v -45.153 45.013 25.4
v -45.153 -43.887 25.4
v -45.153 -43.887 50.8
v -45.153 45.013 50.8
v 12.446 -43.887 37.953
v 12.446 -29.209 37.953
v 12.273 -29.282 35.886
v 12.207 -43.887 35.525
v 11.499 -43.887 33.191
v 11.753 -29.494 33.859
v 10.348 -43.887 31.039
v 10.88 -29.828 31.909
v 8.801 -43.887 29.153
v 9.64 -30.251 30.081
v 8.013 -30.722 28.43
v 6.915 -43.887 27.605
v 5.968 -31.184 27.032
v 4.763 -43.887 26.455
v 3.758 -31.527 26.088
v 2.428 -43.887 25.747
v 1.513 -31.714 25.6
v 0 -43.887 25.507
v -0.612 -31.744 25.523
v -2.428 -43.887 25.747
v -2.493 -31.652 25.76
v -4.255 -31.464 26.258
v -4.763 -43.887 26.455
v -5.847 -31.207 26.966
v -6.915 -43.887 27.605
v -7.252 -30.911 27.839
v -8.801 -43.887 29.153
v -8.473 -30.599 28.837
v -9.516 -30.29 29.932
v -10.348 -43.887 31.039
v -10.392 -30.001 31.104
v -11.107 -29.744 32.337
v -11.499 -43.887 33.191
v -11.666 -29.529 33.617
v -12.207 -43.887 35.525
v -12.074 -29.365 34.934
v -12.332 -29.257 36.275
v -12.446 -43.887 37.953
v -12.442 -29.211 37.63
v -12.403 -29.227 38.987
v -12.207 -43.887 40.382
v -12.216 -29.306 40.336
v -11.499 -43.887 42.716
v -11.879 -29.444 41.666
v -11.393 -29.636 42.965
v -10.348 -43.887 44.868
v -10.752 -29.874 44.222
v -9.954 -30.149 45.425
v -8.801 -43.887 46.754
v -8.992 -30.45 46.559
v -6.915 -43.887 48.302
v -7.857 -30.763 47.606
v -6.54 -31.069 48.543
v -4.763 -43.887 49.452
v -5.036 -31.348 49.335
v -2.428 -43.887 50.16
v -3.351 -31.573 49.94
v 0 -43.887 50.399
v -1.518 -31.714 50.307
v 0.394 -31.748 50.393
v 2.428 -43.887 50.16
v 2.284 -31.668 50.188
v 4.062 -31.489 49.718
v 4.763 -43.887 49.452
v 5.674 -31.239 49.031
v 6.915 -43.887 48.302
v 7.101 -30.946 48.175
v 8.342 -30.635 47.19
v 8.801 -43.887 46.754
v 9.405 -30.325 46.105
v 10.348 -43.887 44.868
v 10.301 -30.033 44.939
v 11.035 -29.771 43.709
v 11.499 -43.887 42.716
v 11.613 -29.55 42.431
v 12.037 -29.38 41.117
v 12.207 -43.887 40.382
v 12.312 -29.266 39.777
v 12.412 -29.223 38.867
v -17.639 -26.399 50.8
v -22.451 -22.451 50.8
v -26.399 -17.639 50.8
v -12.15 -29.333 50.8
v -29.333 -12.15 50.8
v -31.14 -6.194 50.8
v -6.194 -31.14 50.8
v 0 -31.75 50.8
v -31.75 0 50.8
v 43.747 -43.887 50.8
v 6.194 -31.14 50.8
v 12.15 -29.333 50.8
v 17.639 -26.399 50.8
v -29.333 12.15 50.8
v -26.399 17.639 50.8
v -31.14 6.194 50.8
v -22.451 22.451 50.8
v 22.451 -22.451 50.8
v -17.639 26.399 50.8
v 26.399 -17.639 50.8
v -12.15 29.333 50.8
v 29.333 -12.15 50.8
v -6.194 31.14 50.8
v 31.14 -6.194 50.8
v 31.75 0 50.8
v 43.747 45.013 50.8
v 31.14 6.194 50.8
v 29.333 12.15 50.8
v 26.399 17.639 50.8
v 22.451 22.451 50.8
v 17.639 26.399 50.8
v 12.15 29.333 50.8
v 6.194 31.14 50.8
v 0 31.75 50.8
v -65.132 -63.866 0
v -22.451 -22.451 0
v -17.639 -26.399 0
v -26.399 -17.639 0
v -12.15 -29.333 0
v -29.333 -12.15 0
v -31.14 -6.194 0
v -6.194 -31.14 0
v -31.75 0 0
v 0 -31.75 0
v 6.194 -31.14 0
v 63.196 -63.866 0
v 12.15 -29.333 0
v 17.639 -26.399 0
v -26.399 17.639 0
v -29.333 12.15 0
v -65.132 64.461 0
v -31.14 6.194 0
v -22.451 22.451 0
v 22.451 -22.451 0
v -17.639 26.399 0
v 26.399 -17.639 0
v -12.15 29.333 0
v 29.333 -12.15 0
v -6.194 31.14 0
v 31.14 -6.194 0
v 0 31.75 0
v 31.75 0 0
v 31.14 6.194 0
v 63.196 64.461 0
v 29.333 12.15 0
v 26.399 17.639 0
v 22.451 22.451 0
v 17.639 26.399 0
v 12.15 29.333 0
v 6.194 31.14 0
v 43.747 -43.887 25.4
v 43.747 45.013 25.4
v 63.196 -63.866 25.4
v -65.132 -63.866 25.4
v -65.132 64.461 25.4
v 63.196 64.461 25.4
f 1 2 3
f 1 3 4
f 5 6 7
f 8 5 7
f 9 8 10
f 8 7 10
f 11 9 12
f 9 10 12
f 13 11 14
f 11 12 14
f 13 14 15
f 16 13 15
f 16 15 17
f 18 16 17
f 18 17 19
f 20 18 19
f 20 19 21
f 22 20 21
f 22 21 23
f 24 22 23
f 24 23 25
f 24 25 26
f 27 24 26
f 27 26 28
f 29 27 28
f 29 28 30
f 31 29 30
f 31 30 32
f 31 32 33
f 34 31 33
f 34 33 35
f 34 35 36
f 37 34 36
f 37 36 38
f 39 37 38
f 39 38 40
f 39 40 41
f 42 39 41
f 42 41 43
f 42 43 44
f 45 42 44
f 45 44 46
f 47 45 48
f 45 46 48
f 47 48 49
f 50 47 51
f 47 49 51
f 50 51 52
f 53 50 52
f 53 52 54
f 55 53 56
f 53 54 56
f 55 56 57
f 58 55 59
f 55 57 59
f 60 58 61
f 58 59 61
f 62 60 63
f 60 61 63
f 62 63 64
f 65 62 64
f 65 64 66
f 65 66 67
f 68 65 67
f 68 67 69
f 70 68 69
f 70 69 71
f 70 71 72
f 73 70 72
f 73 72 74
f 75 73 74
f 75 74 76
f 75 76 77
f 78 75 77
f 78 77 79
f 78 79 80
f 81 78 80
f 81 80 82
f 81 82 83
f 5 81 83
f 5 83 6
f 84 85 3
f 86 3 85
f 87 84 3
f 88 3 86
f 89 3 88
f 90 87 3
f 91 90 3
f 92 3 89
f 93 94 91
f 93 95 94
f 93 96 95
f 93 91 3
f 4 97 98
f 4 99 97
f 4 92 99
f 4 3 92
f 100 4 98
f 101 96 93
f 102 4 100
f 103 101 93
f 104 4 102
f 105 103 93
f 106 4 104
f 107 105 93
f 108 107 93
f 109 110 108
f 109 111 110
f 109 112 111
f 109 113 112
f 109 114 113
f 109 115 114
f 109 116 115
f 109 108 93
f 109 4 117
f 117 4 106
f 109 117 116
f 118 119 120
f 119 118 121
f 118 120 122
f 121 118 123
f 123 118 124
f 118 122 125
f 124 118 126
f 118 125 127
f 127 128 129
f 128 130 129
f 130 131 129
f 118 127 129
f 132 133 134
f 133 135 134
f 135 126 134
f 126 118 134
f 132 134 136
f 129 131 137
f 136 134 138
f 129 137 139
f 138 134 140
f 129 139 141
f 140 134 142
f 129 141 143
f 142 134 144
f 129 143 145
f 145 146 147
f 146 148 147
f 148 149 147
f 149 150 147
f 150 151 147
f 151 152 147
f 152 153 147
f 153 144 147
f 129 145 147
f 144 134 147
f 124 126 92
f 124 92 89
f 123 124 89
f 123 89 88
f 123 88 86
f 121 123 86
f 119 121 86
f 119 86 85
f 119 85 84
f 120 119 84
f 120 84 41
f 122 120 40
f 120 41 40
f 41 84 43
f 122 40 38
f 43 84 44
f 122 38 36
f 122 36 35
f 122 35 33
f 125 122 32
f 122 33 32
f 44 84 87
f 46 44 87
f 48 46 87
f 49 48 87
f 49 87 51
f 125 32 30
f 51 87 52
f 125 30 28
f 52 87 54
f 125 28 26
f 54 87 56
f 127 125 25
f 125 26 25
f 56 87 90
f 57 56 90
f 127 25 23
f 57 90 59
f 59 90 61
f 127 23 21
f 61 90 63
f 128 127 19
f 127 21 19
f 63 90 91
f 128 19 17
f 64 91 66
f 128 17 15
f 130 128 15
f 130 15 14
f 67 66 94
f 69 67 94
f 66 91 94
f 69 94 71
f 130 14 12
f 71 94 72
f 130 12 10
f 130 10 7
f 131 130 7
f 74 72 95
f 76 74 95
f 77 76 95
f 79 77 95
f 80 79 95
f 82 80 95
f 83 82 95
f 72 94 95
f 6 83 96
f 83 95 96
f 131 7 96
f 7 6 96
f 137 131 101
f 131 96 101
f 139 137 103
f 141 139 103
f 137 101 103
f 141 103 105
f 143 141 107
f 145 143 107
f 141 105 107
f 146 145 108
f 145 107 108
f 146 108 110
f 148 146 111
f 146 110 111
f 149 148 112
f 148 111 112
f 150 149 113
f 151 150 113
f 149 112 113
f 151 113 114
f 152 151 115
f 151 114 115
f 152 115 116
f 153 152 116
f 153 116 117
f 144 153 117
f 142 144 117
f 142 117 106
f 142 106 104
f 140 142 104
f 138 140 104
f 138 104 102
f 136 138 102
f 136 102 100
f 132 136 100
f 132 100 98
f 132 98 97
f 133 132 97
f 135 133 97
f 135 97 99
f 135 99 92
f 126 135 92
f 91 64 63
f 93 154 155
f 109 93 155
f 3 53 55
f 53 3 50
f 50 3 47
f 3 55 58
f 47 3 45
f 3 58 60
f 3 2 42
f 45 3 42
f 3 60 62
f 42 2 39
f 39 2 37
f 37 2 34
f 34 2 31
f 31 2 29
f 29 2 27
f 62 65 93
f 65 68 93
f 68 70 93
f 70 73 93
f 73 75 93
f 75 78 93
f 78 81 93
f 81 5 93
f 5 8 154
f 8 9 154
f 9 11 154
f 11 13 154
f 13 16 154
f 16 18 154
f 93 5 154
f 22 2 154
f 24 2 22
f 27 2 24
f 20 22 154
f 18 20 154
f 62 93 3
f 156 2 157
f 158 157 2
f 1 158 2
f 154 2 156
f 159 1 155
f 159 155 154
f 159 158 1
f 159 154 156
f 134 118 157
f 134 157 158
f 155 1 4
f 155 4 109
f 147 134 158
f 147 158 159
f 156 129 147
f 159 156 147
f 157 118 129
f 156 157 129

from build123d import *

# Parameters (mm, degrees)
F0_W     = 88.9
F0_H     = 88.9
F1_DEPTH = 50.8
F0_W_2   = 128.3277049661
F0_H_2   = 128.3277124166
F2_DEPTH = 25.4
F4_D     = 63.5
F6_D     = 24.892
F6_DEPTH = 63.8674141297


with BuildPart() as f1:
    # F0 (on Top) → F1 (new body)
    with BuildSketch(Plane.XY):
        with Locations((-0.7027200639, 0.5627498746)):
            Rectangle(F0_W, F0_H)
    extrude(amount=F1_DEPTH)

    # F0 (on Top) → F2 (join)
    with BuildSketch(Plane.XY):
        with Locations((-0.9680353105, 0.2974420786)):
            Rectangle(F0_W_2, F0_H_2)
        with Locations((-0.7027200639, 0.5627498746)):
            Rectangle(F0_W, F0_H, mode=Mode.SUBTRACT)
    extrude(amount=F2_DEPTH)

    # F4 (through all)
    with Locations(Plane(origin=(0, 0, 0), x_dir=(1, 0, 0), z_dir=(0, 0, -1))):
        with Locations((0, 0)):
            Hole(F4_D / 2)

    # F6 (through all, one way)
    with BuildSketch(Plane(origin=(0, 0, 0), x_dir=(1, 0, 0), z_dir=(0, 1, 0))):
        with Locations((0, -37.9534624517)):
            Circle(F6_D / 2)
    extrude(amount=-F6_DEPTH, mode=Mode.SUBTRACT)


solid = f1.part
